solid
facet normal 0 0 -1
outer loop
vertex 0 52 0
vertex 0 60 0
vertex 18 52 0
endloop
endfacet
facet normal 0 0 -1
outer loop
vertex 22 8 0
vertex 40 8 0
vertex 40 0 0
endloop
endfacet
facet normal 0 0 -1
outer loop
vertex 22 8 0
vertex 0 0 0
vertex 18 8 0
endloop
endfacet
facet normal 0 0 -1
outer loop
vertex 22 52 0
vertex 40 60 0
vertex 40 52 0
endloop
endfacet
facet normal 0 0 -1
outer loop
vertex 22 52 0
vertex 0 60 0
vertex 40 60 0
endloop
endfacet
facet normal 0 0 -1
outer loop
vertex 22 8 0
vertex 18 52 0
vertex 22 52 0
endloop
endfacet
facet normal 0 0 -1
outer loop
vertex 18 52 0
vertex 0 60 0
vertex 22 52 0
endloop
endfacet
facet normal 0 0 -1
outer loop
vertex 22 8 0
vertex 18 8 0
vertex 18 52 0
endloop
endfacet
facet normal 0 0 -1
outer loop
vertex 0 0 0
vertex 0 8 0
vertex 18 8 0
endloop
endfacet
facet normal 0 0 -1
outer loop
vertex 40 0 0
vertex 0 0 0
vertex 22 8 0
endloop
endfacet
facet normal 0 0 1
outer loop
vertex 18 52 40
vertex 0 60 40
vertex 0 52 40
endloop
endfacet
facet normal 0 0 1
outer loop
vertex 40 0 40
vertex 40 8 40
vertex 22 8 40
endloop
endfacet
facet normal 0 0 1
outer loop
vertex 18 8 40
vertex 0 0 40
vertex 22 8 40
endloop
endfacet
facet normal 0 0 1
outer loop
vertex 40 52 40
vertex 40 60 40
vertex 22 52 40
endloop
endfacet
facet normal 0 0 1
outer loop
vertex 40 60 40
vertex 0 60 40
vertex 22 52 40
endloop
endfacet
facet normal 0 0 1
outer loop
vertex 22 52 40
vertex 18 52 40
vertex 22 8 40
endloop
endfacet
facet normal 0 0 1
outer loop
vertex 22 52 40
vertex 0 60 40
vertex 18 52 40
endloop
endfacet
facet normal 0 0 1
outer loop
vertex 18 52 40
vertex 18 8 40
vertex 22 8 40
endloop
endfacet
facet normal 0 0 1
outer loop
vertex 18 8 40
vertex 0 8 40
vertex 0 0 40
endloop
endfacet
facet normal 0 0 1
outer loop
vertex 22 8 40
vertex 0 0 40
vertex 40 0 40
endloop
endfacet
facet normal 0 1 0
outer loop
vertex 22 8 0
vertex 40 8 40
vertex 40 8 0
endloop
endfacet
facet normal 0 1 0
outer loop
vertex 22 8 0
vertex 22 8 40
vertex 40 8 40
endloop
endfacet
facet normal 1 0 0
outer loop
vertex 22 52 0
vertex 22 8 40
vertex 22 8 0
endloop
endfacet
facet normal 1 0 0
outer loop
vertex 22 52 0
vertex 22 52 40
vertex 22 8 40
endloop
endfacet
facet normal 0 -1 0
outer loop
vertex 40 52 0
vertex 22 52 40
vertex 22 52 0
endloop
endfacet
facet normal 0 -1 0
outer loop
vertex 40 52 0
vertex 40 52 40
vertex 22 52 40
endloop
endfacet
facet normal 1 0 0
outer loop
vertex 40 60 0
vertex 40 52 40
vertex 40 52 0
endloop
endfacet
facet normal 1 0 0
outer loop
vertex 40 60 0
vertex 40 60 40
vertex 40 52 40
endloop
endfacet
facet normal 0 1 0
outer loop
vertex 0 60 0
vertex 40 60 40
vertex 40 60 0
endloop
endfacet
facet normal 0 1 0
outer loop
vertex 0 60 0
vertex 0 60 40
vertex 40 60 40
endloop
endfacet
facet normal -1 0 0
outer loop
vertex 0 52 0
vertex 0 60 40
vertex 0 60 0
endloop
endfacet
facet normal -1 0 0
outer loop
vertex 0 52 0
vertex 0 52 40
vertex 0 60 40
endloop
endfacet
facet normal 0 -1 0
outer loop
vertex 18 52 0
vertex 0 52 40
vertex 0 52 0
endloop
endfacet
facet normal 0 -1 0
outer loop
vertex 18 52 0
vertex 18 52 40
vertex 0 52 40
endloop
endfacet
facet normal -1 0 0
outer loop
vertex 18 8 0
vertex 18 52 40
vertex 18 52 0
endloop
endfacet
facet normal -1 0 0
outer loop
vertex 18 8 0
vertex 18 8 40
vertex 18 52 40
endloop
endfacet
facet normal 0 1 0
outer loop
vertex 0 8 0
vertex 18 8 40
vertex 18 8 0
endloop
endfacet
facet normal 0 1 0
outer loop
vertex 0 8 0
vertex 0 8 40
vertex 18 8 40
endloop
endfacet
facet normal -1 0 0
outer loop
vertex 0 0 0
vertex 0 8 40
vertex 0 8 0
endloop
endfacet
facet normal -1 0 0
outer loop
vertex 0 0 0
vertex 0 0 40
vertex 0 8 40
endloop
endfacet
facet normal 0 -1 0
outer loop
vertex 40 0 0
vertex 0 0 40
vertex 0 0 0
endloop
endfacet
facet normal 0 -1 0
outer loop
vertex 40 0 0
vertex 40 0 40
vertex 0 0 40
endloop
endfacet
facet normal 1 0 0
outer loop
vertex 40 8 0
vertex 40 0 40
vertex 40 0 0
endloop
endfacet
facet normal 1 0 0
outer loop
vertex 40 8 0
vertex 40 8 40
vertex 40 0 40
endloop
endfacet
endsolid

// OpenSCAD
$fn = 32;

// ----------------------------------------------------------------------
// Structural section: ibeam 40 x 60 mm
// ----------------------------------------------------------------------

// --- parameters (mm) ---
sec_w = 40;               // section width, X
sec_h = 60;               // section height, Y
flange_t = 8;             // flange thickness
web_t = 4;                // web thickness
plate_t = 40;             // cut length, Z (extrusion height)

profile = [[0, 0], [40, 0], [40, 8], [22, 8], [22, 52], [40, 52], [40, 60], [0, 60], [0, 52], [18, 52], [18, 8], [0, 8]];  // primary outline, 12 points, counter clockwise

// --- the one profile operation ---
linear_extrude(height = plate_t) polygon(points = profile);
